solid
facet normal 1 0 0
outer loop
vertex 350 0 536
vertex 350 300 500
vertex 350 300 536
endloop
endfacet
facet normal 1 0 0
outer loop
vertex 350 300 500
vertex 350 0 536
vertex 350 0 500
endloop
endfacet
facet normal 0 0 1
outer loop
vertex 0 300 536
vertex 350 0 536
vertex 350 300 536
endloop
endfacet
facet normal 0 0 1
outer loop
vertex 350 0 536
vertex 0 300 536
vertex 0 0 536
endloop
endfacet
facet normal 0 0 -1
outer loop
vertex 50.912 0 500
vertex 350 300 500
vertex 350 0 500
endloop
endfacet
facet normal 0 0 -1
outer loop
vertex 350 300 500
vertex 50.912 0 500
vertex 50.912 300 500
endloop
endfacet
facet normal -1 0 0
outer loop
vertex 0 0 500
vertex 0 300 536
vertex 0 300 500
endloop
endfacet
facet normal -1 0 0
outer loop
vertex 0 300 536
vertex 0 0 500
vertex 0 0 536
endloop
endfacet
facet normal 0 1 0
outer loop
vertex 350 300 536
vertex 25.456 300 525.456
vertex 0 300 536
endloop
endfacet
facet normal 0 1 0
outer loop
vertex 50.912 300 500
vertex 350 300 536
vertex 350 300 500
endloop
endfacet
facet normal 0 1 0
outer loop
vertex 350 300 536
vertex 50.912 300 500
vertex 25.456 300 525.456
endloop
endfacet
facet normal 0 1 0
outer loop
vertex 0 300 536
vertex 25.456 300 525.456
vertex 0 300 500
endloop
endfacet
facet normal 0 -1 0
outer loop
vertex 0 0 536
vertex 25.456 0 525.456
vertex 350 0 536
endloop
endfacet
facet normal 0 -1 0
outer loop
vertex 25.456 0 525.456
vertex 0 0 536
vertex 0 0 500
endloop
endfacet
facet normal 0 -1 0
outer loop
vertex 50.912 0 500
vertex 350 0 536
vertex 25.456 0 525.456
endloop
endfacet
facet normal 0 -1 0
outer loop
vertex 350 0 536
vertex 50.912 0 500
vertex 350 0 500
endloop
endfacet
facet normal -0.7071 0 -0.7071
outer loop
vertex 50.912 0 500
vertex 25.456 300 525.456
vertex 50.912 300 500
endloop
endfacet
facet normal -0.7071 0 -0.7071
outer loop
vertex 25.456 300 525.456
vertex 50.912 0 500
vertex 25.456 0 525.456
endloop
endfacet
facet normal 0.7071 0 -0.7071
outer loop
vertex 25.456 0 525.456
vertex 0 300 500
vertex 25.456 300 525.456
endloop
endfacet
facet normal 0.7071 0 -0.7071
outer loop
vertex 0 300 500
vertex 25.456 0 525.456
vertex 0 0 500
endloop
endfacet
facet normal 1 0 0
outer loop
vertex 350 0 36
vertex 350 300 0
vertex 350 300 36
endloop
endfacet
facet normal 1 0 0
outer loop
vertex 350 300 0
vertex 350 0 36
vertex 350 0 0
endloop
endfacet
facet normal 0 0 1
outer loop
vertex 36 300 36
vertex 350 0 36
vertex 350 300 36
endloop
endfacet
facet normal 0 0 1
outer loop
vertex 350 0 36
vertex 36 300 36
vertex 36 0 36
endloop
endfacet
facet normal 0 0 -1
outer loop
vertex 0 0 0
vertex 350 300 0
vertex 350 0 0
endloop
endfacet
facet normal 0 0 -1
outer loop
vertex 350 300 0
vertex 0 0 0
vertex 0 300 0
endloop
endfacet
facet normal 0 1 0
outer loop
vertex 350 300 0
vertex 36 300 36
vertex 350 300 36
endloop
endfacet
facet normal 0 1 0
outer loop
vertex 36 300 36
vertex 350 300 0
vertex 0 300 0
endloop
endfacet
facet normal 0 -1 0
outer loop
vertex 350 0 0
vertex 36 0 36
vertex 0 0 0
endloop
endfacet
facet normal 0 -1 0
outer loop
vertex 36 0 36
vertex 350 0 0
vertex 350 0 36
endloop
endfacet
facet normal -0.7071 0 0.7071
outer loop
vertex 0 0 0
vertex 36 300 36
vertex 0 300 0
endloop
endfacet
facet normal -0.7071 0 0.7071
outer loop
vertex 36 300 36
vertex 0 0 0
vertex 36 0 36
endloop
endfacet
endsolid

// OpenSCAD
//material stats : t=36,w=385,l=1430

mat_w = 300;
mat_t = 36; //material thickness

//mid_section_l = 700;
h = 500;


mid_section_h = h;
bottom_l = 350;

echo("bottom/tom l =", bottom_l);
echo("mid_section_h =", mid_section_h);
echo("total_l =", bottom_l + bottom_l + mid_section_h);
//echo("heigth =", h);

module mod(x, y, z, a) {
    difference(){
        //bottom
        cube(size = [x, y, z], center = false);

        //bottom
        rotate([0, a,0]) {
            translate([0,-1,0]){
                cube(size = [x, y+2, z], center = false);
            }
        }
    }
}

color("BurlyWood") {
    
//top
translate([0,0,mid_section_h]){

        mod(bottom_l, mat_w, mat_t, 45);
    
}

//bottom
mod(bottom_l, mat_w, mat_t, -45);

/*



//bottom
cube(size = [bottom_l, mat_w, mat_t], center = false);

//midshelf
translate([0,0,(3*h)/6]){
    cube(size = [bottom_l/2, mat_w, mat_t], center = false);
}

//back
cube(size = [mat_t, mat_w, mid_section_h], center = false);
*/
}
